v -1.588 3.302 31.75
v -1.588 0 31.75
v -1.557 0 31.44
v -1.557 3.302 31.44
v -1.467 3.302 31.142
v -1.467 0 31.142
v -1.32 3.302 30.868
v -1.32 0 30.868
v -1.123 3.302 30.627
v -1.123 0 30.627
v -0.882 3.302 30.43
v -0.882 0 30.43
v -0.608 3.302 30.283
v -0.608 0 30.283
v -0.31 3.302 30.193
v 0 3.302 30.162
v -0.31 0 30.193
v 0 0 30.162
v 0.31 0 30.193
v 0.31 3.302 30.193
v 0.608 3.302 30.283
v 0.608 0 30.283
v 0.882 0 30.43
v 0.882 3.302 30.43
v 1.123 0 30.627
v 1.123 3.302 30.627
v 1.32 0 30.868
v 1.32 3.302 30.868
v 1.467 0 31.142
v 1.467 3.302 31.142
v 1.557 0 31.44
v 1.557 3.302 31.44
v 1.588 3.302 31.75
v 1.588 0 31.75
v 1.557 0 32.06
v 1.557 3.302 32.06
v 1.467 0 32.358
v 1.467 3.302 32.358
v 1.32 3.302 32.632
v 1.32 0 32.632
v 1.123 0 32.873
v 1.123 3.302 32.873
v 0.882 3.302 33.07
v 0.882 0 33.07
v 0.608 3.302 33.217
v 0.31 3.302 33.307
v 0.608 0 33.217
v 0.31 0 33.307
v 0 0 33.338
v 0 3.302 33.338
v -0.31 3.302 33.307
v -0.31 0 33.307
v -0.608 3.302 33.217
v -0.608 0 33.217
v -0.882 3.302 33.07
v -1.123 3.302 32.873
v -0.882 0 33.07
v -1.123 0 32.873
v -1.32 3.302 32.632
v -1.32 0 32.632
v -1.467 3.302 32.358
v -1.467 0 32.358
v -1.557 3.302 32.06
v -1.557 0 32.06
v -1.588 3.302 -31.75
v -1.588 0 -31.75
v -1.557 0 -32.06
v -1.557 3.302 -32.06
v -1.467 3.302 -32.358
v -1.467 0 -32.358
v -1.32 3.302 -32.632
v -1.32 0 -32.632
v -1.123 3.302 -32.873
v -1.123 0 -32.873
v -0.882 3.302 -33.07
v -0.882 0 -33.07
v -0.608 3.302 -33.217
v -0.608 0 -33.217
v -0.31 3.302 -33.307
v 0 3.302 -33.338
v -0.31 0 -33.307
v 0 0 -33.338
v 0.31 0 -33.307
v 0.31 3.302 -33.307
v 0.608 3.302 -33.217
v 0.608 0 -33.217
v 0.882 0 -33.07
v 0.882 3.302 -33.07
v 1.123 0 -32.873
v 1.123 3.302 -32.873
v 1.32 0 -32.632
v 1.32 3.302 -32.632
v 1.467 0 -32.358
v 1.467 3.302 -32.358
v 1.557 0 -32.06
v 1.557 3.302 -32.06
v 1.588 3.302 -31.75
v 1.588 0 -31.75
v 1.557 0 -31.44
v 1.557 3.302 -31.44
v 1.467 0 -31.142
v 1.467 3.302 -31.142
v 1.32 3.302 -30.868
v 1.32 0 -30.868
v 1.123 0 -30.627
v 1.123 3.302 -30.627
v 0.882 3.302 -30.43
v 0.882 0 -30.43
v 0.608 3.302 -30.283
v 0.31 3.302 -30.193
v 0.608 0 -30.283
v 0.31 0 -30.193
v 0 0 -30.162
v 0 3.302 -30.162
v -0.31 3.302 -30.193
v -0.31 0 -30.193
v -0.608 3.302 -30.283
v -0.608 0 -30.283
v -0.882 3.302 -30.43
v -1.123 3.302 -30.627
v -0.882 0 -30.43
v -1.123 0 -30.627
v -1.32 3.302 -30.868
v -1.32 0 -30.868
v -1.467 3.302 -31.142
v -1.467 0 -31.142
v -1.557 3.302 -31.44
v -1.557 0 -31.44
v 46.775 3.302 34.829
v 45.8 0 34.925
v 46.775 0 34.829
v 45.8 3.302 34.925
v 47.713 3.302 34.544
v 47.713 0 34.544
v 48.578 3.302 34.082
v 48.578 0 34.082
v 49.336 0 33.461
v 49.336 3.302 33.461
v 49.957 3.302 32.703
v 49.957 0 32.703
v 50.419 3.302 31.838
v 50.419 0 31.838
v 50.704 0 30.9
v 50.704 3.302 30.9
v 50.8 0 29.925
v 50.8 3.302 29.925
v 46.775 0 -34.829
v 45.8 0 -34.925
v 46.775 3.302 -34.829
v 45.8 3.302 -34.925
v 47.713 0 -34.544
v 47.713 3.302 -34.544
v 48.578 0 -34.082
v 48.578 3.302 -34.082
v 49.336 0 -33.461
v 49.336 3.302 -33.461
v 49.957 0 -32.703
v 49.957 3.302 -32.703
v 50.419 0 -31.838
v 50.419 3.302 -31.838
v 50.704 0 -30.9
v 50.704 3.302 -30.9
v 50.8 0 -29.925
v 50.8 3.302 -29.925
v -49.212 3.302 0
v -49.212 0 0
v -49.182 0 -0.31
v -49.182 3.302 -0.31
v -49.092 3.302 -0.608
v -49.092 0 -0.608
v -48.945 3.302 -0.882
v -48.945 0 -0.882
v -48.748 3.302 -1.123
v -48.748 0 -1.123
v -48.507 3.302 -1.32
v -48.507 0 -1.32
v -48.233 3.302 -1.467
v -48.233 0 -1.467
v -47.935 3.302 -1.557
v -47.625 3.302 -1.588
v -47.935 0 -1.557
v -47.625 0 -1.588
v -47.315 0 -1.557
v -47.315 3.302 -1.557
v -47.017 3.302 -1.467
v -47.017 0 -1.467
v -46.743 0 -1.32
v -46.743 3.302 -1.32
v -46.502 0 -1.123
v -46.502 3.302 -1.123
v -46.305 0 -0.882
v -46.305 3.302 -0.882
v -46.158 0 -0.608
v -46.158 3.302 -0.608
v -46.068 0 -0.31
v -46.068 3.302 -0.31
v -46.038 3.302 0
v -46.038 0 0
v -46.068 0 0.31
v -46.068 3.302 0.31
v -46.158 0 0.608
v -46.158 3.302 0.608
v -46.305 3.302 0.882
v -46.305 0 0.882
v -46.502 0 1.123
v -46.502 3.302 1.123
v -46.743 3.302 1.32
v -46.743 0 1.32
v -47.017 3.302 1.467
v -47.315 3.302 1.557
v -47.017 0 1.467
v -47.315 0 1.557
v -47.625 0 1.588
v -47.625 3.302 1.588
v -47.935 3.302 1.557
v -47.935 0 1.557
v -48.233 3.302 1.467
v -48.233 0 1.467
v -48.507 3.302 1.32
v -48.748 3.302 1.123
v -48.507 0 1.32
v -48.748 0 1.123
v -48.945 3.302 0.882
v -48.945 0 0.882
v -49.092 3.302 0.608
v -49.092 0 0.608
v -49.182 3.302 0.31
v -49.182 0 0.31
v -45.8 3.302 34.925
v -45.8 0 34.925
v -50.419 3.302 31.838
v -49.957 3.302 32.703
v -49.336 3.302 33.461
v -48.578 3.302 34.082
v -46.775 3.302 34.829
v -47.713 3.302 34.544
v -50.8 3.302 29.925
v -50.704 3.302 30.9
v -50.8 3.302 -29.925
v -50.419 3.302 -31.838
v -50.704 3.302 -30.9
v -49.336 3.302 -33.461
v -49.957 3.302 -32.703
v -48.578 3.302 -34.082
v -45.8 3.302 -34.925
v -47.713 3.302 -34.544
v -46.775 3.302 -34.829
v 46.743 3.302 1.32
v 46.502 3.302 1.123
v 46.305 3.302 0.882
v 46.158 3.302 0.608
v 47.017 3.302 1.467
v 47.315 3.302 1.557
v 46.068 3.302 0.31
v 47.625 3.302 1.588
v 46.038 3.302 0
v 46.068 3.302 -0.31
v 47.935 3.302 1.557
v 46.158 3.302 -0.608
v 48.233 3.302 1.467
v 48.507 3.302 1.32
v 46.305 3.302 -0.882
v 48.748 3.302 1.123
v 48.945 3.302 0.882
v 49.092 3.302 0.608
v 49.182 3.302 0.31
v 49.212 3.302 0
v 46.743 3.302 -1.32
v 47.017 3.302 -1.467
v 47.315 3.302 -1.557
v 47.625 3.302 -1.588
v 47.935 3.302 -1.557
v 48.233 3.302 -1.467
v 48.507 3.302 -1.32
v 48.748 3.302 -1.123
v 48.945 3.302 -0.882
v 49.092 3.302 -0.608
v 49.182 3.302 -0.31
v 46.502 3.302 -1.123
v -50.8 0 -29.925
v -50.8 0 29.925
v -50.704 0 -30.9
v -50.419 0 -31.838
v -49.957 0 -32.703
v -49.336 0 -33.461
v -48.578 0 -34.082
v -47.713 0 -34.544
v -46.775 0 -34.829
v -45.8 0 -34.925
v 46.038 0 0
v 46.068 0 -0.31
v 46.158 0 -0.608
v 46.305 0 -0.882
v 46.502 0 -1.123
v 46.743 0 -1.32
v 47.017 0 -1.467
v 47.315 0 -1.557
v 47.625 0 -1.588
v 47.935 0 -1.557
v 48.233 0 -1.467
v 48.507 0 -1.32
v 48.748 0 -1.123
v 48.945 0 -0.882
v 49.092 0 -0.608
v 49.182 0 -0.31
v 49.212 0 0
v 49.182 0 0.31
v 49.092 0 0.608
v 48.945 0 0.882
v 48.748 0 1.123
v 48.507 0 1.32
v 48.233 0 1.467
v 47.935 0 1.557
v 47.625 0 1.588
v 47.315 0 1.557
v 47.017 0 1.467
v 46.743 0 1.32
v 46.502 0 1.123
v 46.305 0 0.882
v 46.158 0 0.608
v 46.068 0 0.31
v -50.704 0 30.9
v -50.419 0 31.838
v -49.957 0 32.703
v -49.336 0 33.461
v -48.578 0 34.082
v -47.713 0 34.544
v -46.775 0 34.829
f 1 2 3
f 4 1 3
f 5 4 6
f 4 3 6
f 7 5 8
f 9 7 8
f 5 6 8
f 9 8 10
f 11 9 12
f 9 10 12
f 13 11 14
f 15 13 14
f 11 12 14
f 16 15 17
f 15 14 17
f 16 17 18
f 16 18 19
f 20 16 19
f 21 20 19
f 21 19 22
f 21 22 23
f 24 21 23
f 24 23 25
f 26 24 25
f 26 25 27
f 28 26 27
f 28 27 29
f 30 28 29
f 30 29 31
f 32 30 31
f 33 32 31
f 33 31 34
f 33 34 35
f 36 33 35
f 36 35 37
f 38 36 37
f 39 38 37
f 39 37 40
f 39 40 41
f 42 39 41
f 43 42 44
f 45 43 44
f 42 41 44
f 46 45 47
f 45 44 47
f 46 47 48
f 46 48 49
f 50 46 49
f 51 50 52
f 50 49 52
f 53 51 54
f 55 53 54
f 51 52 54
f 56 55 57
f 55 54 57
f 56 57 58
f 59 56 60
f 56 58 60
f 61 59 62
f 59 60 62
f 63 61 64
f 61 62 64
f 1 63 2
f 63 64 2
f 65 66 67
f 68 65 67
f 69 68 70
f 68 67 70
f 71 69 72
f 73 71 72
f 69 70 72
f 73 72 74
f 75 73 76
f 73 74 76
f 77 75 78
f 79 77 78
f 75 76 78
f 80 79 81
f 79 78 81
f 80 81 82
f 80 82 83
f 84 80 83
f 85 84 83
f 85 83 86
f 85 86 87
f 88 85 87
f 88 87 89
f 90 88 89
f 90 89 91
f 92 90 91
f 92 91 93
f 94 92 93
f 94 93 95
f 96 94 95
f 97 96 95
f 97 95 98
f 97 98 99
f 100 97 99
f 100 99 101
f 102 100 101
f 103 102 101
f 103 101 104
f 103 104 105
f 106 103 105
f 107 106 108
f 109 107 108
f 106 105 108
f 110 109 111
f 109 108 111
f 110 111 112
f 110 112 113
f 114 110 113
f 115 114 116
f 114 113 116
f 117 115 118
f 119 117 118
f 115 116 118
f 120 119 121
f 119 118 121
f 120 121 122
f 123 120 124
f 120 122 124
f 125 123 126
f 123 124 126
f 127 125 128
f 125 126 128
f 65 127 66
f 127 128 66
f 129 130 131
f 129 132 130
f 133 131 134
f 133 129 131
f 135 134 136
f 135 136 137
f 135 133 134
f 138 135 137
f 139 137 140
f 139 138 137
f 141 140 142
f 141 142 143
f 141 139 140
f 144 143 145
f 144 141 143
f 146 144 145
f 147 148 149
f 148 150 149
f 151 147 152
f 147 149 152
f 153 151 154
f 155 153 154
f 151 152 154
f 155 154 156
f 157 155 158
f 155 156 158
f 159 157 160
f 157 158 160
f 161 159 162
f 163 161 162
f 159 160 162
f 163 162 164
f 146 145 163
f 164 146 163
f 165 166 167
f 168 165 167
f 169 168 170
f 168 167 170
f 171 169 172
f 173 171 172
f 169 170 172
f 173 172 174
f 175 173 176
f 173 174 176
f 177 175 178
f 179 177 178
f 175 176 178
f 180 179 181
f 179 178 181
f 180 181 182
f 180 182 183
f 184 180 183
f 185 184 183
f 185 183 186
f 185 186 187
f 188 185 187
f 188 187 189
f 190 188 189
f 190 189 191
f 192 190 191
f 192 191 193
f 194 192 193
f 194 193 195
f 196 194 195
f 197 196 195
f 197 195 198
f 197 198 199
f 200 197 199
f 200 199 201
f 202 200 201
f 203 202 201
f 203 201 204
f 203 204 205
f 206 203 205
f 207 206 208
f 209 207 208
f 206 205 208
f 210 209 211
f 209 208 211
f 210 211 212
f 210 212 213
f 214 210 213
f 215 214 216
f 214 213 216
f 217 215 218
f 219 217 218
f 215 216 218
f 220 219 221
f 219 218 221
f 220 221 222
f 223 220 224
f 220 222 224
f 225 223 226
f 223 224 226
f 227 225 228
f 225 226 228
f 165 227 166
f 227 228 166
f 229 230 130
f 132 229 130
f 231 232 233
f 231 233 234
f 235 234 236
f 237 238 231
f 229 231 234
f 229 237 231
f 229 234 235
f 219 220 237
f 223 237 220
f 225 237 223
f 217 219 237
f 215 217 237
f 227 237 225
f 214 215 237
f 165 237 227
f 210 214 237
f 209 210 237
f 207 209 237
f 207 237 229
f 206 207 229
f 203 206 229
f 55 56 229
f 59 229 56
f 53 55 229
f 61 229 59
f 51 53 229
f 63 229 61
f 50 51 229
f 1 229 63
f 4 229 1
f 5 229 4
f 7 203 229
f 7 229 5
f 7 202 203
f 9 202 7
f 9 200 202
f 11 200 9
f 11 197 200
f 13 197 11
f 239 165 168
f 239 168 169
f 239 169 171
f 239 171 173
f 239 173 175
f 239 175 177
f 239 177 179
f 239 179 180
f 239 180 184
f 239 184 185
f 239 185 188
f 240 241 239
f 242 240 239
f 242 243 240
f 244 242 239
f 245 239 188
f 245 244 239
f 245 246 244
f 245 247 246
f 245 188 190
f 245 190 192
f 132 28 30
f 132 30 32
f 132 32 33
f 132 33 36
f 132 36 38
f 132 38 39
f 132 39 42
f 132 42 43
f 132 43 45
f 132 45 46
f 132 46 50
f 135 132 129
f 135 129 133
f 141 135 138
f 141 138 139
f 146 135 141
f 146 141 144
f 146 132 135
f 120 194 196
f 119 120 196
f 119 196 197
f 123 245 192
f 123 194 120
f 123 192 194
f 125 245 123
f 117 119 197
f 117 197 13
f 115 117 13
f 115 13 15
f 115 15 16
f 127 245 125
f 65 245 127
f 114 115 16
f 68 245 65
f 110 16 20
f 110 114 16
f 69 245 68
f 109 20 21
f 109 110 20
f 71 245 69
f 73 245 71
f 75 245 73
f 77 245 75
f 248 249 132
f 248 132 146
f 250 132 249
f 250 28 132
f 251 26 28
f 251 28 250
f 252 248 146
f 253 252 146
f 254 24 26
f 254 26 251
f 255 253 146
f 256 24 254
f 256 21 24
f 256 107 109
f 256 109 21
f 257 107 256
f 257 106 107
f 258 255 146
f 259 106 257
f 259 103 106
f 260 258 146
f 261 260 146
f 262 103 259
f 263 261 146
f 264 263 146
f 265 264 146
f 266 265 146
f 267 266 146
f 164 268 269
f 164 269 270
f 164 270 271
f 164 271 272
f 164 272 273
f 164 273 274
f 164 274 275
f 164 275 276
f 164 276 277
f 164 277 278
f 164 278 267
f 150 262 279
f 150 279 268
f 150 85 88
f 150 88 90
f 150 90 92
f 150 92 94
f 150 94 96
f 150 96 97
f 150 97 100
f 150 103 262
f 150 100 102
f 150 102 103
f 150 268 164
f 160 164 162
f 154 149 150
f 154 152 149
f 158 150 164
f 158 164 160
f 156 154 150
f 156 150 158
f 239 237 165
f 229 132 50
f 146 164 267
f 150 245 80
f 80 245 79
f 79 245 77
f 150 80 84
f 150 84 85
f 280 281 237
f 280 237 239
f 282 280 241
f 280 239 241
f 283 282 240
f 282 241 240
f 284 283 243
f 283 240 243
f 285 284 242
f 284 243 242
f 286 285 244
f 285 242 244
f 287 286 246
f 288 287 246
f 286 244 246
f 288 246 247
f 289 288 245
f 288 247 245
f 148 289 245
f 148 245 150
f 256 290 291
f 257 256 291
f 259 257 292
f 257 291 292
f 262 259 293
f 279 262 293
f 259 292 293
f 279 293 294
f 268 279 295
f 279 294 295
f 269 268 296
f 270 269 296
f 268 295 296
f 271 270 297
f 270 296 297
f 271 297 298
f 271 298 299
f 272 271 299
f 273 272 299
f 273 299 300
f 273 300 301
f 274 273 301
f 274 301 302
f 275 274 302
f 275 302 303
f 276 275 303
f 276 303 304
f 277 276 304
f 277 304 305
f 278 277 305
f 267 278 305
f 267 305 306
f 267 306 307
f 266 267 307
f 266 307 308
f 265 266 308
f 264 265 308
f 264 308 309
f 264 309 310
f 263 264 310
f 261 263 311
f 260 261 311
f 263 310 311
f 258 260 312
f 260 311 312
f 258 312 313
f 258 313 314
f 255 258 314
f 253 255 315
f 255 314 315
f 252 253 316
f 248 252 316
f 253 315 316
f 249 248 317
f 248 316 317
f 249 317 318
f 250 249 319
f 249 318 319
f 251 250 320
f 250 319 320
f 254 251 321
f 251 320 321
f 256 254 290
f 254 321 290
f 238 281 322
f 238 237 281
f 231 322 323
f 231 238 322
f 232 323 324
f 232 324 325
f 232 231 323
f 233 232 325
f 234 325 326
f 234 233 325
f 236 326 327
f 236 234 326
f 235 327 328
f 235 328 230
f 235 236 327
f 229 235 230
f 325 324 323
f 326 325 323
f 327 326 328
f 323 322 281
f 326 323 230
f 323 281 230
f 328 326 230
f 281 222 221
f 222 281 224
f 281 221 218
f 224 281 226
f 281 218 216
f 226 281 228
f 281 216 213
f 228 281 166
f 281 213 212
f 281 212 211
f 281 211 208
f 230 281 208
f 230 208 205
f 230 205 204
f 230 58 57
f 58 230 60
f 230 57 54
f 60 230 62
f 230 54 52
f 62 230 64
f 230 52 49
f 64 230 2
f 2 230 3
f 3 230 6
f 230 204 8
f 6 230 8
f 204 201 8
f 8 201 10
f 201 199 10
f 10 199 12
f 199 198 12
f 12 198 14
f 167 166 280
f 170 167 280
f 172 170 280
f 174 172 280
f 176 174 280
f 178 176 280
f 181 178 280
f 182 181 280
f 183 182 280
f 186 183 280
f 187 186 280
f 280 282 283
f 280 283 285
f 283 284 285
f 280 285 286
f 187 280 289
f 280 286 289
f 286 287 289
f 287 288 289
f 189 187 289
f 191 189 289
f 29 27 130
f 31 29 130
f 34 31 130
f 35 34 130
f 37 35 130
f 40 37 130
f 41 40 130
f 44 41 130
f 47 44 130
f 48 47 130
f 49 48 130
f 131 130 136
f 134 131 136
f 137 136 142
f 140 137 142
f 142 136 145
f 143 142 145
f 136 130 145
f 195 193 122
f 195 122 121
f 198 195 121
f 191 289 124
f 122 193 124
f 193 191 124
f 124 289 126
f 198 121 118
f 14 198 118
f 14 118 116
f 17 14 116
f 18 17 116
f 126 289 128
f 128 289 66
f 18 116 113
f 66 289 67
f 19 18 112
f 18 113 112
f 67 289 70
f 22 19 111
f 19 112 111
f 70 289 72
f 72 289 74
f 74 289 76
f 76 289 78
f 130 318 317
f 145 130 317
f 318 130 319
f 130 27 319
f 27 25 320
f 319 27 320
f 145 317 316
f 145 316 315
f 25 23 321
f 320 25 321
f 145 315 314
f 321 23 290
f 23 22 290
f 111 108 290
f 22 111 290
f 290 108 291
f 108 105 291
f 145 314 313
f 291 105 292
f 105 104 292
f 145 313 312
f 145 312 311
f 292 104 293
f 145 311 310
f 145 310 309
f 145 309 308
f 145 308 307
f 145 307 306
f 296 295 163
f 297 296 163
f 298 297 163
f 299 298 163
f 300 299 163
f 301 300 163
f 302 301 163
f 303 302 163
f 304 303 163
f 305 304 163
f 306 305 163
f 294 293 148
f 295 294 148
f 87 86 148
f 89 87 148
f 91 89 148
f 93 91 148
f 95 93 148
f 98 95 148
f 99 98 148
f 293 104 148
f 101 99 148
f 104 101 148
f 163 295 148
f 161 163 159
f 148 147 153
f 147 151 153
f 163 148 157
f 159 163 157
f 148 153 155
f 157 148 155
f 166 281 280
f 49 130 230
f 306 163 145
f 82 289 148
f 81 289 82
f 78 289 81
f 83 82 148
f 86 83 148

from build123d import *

# Parameters (mm, degrees)
SKETCH1_W           = 101.6
SKETCH1_H           = 69.85
BOSS_EXTRUDE1_DEPTH = 3.302
SKETCH4_R           = 1.5875
CUT_EXTRUDE1_DEPTH  = 4.302
FILLET1_R           = 5


with BuildPart() as part:
    # Sketch1 → Boss-Extrude1 (new body)
    with BuildSketch(Plane(origin=(0, 0, 0), x_dir=(1, 0, 0), z_dir=(0, 1, 0))):
        Rectangle(SKETCH1_W, SKETCH1_H)
    extrude(amount=BOSS_EXTRUDE1_DEPTH)

    # Sketch4 → Cut-Extrude1 (cut, through all)
    with BuildSketch(Plane(origin=(0, 0, 0), x_dir=(-1, 0, 0), z_dir=(0, -1, 0))):
        with Locations((0, 31.75)):
            Circle(SKETCH4_R)
        with Locations((-47.625, 0)):
            Circle(SKETCH4_R)
        with Locations((0, -31.75)):
            Circle(SKETCH4_R)
        with Locations((47.625, 0)):
            Circle(SKETCH4_R)
    extrude(amount=-CUT_EXTRUDE1_DEPTH, mode=Mode.SUBTRACT)

    # Fillet1
    fillet1_edges = [part.edges().sort_by_distance(p)[0] for p in [
        (50.8, 1.651, 34.925),
        (-50.8, 1.651, 34.925),
        (-50.8, 1.651, -34.925),
        (50.8, 1.651, -34.925),
    ]]
    fillet(fillet1_edges, radius=FILLET1_R)


solid = part.part
